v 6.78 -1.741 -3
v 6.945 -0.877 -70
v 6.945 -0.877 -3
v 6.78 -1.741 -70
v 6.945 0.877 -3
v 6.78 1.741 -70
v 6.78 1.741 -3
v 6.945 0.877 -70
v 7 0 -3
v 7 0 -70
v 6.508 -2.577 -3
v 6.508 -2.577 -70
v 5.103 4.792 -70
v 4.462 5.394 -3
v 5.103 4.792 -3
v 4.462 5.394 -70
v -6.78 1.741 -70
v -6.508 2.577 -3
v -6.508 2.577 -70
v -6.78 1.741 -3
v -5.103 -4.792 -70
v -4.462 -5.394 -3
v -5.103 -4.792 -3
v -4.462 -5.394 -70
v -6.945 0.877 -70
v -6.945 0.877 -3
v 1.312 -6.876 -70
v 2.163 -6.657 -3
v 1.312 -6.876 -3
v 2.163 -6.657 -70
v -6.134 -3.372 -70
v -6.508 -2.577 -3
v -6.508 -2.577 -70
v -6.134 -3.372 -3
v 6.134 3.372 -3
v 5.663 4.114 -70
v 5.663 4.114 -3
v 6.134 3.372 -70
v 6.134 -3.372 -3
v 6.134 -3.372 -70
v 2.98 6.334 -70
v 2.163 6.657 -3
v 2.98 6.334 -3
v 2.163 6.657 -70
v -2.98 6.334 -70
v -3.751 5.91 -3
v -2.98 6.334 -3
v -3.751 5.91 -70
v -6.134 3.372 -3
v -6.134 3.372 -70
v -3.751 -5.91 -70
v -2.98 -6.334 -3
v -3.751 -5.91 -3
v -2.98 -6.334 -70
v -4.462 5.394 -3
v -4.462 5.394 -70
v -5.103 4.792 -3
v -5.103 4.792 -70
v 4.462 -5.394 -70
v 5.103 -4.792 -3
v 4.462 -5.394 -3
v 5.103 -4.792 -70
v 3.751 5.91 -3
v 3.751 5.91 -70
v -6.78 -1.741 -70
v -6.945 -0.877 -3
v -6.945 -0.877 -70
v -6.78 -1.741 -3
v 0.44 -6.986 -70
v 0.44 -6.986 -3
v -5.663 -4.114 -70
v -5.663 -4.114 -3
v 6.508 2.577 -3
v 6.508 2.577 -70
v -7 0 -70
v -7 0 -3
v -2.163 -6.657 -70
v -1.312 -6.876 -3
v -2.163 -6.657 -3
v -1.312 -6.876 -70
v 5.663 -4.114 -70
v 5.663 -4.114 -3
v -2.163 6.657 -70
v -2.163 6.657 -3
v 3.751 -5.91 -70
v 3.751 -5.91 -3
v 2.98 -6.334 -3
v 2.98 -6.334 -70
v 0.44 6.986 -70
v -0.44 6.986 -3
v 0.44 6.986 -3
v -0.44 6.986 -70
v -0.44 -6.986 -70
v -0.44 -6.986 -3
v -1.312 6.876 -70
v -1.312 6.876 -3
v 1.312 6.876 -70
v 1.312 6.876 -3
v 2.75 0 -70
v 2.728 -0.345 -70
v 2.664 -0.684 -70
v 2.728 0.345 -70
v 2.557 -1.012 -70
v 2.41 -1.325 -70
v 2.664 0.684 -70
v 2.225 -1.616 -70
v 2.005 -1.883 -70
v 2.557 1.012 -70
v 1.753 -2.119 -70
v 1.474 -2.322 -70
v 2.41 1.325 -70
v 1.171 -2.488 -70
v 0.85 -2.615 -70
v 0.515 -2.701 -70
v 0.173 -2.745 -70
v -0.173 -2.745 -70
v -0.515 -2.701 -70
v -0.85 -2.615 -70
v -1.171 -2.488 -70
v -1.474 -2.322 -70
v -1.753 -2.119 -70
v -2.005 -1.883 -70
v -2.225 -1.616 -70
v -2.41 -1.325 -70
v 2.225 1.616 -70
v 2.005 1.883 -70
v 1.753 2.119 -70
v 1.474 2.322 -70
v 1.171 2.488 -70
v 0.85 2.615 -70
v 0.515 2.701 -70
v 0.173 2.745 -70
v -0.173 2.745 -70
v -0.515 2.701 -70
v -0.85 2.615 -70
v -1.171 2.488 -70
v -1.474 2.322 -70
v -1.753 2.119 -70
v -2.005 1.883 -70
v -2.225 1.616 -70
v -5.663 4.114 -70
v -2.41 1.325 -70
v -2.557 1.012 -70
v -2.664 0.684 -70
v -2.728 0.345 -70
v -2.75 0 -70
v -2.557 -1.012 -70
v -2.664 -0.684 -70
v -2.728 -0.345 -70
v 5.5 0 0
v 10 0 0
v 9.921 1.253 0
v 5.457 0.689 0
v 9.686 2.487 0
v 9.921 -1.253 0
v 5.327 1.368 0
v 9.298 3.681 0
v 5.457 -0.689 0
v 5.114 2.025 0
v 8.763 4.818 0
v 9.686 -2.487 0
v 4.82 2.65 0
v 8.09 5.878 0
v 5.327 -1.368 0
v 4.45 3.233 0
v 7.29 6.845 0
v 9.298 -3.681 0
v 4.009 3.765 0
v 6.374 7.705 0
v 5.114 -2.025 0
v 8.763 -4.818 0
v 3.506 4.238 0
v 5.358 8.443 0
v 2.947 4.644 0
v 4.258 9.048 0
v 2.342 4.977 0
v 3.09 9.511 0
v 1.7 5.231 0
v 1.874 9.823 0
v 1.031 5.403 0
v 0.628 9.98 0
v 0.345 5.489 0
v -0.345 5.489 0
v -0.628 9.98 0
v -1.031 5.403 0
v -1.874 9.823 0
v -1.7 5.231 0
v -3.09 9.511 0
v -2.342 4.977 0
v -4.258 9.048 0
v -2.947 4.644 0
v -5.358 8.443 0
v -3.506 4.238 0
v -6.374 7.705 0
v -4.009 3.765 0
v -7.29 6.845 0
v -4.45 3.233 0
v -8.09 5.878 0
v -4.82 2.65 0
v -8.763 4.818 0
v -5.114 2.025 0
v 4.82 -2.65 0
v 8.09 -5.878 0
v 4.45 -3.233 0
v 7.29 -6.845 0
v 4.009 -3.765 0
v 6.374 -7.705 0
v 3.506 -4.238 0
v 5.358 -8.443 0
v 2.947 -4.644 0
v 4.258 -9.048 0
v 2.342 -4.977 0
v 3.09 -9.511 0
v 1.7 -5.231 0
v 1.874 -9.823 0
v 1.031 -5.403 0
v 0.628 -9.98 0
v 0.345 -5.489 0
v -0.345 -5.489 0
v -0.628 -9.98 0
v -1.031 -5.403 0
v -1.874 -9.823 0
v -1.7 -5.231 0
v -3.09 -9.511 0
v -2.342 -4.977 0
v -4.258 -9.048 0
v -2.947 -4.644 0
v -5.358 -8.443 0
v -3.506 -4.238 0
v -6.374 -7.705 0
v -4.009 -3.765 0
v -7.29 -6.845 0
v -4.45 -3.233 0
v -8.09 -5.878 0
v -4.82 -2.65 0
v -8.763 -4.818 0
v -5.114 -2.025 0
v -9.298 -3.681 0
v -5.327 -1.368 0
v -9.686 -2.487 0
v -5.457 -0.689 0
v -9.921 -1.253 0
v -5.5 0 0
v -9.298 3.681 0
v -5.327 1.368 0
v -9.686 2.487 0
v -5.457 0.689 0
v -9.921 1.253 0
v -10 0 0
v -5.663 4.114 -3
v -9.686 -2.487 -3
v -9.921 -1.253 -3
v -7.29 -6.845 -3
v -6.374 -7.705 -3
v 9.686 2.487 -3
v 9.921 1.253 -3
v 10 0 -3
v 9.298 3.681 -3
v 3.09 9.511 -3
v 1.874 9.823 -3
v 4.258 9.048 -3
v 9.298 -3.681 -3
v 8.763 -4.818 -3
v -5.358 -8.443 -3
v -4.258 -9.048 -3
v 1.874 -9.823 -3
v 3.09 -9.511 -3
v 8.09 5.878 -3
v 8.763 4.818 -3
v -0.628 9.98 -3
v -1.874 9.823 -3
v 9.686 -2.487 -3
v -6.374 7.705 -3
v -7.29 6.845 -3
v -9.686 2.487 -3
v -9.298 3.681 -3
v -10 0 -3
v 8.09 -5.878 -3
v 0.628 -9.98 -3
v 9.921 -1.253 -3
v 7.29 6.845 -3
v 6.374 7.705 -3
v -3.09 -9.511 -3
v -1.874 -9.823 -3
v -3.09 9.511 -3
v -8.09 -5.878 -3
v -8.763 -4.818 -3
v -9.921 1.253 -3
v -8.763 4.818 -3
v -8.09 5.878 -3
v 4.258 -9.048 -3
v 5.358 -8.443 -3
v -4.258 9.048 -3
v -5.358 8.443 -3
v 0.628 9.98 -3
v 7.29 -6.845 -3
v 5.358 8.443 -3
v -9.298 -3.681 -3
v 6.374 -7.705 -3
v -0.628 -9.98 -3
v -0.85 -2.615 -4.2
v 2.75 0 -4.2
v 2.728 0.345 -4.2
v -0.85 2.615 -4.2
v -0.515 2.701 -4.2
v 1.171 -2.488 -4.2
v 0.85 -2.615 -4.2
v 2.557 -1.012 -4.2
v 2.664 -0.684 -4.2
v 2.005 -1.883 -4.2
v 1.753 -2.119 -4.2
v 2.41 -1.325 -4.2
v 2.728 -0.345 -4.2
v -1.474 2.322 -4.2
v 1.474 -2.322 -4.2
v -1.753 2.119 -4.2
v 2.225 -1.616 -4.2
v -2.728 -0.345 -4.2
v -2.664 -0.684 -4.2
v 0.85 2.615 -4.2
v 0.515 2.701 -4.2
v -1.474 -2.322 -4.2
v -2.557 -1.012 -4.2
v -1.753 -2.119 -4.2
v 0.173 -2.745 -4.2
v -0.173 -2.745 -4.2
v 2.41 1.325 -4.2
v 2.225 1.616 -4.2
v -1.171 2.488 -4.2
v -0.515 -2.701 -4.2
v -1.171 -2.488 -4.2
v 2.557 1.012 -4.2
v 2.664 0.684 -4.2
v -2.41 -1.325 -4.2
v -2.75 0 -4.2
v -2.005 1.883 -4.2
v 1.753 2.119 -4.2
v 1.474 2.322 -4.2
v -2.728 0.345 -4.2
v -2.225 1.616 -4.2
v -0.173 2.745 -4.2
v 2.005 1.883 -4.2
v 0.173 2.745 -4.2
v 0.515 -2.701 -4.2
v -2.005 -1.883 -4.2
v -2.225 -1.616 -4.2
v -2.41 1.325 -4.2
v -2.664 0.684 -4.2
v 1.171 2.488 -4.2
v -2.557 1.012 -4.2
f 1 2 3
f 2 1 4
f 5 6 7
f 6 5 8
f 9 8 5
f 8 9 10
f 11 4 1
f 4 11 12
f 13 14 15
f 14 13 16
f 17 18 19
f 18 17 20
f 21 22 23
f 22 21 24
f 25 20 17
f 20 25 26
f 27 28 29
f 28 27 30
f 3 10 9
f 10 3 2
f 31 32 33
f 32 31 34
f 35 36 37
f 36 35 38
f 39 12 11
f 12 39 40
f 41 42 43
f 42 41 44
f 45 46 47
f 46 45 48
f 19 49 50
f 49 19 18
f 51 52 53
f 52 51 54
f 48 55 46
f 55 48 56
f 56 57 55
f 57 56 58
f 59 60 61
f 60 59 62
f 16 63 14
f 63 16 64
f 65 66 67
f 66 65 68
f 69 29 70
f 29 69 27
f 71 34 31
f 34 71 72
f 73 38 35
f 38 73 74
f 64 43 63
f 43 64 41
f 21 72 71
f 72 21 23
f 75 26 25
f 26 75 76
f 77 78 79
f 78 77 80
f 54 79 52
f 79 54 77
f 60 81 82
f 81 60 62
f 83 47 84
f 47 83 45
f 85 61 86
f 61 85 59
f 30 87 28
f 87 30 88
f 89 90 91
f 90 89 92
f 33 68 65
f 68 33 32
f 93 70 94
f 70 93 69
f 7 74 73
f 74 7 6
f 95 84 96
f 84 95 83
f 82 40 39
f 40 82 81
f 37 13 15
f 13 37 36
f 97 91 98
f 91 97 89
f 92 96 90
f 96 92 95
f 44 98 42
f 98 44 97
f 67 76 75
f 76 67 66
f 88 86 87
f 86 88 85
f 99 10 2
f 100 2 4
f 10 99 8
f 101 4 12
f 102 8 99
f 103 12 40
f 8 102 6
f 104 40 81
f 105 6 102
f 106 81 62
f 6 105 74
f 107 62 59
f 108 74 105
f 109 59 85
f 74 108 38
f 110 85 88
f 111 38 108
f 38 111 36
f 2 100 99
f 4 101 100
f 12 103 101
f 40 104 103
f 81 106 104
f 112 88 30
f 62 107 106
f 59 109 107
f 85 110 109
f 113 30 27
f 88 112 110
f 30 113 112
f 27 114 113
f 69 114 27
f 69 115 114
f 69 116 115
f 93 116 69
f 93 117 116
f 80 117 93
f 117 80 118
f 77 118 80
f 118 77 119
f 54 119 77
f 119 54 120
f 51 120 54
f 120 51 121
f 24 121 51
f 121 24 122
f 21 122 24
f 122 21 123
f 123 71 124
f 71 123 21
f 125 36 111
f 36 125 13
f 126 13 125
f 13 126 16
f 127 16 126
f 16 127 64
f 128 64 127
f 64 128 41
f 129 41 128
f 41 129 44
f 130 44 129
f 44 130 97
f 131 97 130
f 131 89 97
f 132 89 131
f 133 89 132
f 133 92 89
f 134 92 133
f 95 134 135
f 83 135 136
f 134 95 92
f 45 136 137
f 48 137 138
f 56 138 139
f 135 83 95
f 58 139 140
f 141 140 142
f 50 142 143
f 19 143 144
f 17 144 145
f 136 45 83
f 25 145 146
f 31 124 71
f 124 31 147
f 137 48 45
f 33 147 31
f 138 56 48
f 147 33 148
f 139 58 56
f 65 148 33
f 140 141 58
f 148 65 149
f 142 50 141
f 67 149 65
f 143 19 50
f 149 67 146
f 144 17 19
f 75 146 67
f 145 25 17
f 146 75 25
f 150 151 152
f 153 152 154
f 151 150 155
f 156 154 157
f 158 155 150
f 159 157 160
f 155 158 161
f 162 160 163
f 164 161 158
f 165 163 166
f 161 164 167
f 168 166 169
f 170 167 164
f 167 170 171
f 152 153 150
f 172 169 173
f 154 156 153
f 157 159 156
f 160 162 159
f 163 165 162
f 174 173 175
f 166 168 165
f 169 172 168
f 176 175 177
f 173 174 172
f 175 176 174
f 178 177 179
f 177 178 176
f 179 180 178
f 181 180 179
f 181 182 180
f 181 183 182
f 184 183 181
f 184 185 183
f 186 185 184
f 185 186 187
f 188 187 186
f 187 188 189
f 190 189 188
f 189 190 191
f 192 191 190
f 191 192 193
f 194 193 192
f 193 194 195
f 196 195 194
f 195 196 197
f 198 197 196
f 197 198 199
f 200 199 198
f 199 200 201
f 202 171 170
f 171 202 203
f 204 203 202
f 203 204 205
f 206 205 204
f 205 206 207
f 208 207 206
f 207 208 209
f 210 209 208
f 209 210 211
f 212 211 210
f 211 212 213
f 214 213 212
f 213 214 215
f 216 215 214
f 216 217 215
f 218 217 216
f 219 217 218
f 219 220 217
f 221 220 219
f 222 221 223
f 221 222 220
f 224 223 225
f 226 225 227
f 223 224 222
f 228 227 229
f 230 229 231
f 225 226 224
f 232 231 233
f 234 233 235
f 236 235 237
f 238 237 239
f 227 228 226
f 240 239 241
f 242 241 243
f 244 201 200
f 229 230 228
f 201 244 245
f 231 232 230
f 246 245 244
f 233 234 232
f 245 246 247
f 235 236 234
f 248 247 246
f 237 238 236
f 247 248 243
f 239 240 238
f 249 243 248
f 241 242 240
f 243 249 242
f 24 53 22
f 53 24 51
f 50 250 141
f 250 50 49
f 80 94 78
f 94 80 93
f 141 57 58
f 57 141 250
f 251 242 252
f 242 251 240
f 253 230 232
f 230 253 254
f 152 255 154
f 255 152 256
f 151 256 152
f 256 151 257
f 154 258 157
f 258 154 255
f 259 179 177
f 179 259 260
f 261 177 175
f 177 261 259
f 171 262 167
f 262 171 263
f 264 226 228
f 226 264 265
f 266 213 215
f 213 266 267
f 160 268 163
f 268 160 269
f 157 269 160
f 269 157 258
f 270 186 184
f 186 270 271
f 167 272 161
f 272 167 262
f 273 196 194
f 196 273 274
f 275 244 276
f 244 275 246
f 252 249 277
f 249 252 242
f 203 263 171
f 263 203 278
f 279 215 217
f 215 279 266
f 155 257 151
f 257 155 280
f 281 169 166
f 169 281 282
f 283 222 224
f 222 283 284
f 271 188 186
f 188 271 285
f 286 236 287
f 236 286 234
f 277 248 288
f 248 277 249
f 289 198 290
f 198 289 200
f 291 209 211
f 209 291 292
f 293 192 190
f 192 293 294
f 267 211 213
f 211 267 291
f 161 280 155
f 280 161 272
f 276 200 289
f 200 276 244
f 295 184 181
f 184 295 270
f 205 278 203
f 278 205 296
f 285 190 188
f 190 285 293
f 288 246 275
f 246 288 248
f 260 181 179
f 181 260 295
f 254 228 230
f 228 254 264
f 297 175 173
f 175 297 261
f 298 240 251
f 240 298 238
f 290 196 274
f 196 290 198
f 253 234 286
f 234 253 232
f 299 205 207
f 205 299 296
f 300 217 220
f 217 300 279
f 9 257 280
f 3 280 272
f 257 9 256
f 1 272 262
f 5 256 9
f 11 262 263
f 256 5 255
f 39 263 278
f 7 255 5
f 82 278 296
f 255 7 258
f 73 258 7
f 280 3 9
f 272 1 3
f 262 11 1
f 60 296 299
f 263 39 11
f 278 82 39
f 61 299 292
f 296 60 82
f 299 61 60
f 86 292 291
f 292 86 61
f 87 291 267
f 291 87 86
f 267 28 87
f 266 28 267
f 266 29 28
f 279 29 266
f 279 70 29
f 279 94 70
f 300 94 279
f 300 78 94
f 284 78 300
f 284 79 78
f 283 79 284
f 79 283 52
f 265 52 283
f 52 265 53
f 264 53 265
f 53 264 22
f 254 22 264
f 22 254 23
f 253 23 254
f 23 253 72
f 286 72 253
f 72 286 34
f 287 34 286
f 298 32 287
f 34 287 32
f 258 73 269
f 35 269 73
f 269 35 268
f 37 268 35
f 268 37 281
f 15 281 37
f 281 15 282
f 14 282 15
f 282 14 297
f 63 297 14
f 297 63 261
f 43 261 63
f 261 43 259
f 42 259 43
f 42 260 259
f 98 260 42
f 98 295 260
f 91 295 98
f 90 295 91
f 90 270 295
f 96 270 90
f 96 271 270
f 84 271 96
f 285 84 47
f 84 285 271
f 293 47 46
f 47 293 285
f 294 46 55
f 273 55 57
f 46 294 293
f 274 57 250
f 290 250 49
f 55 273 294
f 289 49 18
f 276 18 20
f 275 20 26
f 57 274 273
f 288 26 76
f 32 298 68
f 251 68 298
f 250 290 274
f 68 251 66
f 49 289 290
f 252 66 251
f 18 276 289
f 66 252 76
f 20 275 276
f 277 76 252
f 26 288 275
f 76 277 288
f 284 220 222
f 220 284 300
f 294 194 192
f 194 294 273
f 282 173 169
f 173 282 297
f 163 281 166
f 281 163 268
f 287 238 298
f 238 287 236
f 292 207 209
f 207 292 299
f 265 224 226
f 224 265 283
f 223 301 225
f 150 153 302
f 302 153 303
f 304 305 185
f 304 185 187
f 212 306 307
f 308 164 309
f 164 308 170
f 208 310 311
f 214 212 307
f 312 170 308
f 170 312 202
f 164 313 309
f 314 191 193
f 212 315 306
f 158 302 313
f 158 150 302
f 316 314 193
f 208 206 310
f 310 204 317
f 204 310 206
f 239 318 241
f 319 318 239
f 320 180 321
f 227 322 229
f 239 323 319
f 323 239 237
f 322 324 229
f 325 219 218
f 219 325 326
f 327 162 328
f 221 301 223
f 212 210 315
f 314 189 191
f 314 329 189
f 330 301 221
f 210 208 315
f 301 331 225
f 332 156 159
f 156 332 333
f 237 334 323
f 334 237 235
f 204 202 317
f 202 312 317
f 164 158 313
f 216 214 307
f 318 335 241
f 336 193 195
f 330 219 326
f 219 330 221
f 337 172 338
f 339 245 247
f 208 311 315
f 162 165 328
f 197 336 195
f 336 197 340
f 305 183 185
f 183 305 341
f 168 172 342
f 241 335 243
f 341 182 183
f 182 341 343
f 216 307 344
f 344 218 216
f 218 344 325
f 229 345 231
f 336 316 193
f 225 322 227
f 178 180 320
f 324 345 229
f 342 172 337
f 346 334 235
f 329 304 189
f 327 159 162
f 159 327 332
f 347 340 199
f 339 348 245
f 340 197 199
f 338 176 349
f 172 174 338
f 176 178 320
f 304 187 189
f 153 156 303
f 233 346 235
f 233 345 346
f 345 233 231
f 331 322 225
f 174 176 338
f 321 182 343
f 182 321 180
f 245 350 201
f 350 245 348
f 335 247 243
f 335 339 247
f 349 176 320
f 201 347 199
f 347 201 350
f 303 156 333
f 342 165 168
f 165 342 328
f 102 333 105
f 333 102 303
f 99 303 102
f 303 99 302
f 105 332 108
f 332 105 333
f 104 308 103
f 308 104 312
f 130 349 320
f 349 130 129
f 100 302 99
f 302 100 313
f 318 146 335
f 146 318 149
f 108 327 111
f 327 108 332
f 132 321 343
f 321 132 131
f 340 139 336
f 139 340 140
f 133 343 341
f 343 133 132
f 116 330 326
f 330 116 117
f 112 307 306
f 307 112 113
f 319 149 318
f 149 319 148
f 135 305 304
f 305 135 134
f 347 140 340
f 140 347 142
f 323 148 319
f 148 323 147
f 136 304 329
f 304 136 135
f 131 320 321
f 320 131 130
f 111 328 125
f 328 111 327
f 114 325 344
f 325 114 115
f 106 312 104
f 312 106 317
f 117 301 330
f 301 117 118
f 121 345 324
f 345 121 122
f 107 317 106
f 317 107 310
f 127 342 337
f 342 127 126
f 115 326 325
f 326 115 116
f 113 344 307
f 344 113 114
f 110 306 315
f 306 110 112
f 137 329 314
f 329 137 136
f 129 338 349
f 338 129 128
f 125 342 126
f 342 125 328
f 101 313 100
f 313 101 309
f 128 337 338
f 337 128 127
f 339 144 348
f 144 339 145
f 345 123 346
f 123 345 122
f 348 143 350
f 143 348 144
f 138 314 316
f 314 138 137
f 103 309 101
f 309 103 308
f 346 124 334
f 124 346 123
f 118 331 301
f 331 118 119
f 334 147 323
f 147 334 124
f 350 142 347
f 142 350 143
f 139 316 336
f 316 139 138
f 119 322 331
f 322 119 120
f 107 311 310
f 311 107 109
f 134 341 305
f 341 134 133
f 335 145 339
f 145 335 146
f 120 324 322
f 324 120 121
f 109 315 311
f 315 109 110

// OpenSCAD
$fn = 50;


difference() {
	union() {
		translate(v = [0, 0, -70.0000000000]) {
			cylinder(h = 70, r = 7.0000000000);
		}
		translate(v = [0, 0, -3.0000000000]) {
			cylinder(h = 3, r = 10.0000000000);
		}
	}
	union() {
		translate(v = [0, 0, 0]) {
			rotate(a = [0, 0, 0]) {
				difference() {
					union() {
						#translate(v = [0, 0, -70.0000000000]) {
							cylinder(h = 70, r = 2.2500000000);
						}
						#translate(v = [0, 0, -4.2000000000]) {
							cylinder(h = 4.2000000000, r = 7.0000000000, r1 = 2.7500000000, r2 = 5.5000000000);
						}
						#translate(v = [0, 0, -70.0000000000]) {
							cylinder(h = 70, r = 2.7500000000);
						}
						#translate(v = [0, 0, -70.0000000000]) {
							cylinder(h = 70, r = 2.2500000000);
						}
					}
					union();
				}
			}
		}
	}
}
